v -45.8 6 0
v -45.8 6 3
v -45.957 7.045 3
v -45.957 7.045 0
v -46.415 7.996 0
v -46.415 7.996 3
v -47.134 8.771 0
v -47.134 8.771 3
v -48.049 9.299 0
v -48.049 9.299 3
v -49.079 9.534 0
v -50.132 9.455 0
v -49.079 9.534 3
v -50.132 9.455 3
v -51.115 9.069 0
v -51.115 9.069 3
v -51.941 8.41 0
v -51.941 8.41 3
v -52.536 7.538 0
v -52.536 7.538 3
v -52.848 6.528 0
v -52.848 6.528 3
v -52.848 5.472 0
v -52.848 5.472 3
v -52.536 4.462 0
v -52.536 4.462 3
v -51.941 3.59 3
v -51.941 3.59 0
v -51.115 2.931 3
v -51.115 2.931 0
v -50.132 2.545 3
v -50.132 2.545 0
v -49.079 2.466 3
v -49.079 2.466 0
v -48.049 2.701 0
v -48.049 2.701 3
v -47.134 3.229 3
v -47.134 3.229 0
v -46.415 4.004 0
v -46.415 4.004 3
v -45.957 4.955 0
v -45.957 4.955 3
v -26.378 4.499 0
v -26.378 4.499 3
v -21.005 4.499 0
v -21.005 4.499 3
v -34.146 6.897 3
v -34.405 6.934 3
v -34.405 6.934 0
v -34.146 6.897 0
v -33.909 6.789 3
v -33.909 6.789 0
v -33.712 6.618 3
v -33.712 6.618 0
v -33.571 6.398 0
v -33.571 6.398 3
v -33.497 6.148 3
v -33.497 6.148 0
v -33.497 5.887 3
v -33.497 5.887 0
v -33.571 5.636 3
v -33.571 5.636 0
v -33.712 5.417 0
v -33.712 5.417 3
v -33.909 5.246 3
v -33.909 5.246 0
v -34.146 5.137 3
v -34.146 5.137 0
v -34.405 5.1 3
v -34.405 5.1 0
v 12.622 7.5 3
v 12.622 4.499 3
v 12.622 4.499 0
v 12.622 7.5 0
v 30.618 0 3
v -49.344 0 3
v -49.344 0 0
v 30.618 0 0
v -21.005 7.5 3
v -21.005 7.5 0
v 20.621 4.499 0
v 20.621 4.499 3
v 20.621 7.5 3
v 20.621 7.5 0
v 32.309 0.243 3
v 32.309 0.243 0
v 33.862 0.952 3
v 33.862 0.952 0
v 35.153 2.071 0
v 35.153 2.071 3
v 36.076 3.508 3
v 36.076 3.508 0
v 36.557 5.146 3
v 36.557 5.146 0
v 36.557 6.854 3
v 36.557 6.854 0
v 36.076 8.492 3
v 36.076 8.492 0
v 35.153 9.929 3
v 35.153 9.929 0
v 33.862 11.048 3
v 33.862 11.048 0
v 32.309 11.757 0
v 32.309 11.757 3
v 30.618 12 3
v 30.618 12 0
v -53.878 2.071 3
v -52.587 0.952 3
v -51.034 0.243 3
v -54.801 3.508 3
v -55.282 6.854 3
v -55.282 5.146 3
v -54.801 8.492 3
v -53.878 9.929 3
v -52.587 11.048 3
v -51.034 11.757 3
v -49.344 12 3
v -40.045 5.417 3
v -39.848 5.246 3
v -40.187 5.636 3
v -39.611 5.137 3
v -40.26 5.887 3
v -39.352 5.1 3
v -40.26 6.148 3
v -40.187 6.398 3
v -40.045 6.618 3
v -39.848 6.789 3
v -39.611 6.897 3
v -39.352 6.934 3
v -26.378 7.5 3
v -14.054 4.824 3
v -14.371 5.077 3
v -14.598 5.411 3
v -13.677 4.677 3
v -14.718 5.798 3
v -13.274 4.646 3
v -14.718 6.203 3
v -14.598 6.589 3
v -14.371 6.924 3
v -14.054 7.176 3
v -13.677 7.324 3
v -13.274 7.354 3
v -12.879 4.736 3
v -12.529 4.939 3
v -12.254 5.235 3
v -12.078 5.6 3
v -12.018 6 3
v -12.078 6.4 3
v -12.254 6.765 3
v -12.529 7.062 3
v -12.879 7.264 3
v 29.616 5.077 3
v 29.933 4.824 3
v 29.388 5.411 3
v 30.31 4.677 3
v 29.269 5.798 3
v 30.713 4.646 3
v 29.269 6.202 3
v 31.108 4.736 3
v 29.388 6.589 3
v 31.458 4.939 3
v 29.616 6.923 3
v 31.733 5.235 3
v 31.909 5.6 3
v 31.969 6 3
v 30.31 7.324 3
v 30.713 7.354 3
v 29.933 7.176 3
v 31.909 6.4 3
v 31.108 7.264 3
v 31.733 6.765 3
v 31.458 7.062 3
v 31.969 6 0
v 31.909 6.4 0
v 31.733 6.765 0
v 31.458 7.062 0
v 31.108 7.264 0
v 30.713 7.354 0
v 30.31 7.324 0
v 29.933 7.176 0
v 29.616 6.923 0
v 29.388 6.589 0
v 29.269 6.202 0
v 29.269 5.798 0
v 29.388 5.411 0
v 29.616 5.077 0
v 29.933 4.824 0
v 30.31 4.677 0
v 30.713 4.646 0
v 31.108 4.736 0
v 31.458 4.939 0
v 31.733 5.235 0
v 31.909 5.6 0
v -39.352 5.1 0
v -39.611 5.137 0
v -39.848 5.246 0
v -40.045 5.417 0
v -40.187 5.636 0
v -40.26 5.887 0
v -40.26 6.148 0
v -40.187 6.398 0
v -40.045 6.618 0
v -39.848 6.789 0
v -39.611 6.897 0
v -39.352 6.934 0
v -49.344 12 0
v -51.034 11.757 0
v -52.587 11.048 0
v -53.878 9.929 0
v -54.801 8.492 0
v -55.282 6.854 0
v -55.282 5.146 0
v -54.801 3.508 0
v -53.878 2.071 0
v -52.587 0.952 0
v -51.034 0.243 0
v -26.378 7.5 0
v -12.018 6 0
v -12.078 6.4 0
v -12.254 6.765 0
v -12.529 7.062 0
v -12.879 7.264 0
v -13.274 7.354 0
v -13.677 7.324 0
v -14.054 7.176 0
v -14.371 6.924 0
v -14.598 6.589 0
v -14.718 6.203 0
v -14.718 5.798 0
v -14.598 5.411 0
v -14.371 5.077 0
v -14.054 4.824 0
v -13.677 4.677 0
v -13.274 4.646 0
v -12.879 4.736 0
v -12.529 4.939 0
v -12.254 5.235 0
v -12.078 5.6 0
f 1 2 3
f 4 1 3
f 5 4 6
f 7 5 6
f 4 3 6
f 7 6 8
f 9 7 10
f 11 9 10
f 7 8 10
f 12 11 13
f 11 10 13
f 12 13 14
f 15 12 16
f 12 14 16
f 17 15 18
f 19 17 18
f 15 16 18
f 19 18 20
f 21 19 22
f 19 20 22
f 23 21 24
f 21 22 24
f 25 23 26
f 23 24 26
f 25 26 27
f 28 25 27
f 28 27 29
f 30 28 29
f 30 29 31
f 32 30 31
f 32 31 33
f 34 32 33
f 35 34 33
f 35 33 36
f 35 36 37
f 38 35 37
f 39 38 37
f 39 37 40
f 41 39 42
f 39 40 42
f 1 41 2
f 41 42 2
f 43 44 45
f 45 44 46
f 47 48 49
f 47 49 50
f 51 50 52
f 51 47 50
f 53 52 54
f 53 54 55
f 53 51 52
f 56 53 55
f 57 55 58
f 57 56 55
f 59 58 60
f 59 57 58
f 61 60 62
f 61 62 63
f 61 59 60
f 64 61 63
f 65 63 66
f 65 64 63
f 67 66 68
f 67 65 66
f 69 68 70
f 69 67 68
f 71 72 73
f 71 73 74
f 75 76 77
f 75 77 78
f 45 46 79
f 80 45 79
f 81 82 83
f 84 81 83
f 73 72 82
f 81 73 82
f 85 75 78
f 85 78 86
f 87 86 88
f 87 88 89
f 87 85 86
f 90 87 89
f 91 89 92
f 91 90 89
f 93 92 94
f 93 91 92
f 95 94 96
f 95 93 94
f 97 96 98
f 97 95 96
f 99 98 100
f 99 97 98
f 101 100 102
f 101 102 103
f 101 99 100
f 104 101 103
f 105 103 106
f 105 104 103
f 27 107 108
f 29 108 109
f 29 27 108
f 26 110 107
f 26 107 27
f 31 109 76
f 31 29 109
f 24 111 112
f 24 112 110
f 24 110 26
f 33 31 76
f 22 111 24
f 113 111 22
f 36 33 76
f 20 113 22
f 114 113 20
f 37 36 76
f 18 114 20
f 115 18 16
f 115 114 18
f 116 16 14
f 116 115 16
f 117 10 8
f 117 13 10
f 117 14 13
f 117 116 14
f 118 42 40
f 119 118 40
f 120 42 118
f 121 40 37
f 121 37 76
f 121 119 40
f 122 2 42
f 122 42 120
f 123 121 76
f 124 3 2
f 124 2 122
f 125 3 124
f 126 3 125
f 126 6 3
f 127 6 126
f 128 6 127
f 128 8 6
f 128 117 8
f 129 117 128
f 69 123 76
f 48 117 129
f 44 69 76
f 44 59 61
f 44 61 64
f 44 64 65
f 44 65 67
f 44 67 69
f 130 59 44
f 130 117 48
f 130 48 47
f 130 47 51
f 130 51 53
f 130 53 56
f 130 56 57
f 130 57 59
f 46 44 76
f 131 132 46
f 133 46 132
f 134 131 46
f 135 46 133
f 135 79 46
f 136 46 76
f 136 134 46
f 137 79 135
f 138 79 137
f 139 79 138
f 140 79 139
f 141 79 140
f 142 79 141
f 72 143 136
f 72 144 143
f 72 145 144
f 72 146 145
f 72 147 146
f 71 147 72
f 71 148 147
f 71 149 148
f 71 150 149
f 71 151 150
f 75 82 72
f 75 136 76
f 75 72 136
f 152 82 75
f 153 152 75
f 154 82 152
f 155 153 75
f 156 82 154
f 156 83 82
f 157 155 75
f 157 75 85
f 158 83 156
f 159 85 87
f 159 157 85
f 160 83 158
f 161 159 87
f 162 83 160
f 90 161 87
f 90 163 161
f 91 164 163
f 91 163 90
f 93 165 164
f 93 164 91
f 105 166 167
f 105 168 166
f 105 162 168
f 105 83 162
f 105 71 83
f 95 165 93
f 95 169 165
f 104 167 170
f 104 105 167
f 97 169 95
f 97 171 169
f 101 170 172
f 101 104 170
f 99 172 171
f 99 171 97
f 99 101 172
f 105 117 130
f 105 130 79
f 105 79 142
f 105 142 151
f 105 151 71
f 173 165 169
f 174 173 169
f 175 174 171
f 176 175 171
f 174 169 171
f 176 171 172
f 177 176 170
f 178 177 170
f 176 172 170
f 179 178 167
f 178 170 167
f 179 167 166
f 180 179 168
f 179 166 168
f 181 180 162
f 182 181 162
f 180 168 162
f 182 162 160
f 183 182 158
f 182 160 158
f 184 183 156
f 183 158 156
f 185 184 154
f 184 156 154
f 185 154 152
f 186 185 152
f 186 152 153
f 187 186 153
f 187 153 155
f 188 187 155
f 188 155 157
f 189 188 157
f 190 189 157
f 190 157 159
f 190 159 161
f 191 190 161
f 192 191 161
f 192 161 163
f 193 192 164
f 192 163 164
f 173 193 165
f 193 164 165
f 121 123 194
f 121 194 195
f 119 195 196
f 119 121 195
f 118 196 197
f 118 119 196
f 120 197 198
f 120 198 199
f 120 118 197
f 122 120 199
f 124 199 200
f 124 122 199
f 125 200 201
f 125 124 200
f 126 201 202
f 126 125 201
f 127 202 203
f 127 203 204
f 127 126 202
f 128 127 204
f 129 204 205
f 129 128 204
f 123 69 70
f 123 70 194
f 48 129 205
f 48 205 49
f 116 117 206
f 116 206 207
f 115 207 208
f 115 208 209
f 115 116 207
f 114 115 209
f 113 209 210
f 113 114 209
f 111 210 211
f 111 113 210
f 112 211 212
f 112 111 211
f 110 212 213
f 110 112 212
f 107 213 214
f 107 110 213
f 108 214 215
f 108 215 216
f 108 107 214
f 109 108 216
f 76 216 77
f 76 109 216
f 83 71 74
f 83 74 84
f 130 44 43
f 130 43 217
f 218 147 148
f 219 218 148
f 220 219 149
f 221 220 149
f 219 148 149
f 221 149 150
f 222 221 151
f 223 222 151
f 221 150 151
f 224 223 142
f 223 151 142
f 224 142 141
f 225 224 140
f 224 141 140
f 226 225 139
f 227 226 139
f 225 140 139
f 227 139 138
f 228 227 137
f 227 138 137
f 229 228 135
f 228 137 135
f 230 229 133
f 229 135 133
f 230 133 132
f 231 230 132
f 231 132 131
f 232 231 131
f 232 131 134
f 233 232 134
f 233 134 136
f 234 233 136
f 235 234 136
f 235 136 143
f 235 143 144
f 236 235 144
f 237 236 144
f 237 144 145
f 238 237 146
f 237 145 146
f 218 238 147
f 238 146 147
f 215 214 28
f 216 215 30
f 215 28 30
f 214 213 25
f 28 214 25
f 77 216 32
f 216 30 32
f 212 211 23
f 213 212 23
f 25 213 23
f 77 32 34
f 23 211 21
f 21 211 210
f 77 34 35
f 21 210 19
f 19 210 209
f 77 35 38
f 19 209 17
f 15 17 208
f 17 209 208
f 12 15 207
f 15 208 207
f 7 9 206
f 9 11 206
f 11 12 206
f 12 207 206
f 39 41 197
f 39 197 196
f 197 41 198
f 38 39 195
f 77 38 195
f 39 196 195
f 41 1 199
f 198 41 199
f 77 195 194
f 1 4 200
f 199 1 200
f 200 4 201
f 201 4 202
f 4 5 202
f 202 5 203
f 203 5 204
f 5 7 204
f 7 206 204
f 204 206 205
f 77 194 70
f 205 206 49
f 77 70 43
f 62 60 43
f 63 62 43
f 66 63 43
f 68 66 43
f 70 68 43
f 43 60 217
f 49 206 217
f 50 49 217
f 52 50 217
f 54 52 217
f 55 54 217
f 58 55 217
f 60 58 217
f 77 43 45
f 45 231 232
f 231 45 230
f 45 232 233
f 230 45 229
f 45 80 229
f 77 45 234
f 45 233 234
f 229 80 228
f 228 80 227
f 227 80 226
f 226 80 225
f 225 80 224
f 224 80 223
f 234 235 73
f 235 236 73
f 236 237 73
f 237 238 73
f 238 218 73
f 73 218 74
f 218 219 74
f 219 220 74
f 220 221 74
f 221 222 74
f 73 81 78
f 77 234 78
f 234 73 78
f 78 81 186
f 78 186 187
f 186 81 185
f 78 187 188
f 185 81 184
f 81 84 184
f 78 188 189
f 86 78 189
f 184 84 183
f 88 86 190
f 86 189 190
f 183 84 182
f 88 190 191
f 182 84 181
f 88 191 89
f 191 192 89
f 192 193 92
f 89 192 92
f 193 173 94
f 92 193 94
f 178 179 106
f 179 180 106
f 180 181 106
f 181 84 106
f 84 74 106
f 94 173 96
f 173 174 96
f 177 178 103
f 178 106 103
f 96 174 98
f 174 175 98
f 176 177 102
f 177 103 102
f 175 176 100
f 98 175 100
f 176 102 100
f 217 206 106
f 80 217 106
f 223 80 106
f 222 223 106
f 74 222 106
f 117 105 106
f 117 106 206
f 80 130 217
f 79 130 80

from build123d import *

# Parameters (mm, degrees)
SKETCH_1_R      = 3.543825796
SKETCH_1_R_2    = 1.357591064
SKETCH_1_W      = 5.3728
SKETCH_1_H      = 3.0001
SKETCH_1_W_2    = 7.9992
EXTRUDE_1_DEPTH = 3


with BuildPart() as part:
    # 草图1 → 凸台-拉伸1 (new body)
    with BuildSketch(Plane.XY.offset(3)):
        with BuildLine():
            Line((-49.343510787, 0), (30.618171933, 0))
            ThreePointArc((30.618171933, 0), (36.618171933, 6), (30.618171933, 12))
            Line((30.618171933, 12), (-49.343510787, 12))
            ThreePointArc((-49.343510787, 12), (-55.343510787, 6), (-49.343510787, 0))
        make_face()
        with Locations((-49.343510787, 6)):
            Circle(SKETCH_1_R, mode=Mode.SUBTRACT)
        with Locations((-13.375343302, 6.0002)):
            Circle(SKETCH_1_R_2, mode=Mode.SUBTRACT)
        with Locations((30.611606698, 6.0001)):
            Circle(SKETCH_1_R_2, mode=Mode.SUBTRACT)
        with Locations((-23.691393302, 5.99945)):
            Rectangle(SKETCH_1_W, SKETCH_1_H, mode=Mode.SUBTRACT)
        with BuildLine():
            Line((-39.352347519, 6.934252935), (-34.404739086, 6.934252935))
            ThreePointArc((-34.404739086, 6.934252935), (-33.487662618, 6.017176468), (-34.404739086, 5.1001))
            Line((-34.404739086, 5.1001), (-39.352347519, 5.1001))
            ThreePointArc((-39.352347519, 5.1001), (-40.269423986, 6.017176468), (-39.352347519, 6.934252935))
        make_face(mode=Mode.SUBTRACT)
        with Locations((16.621706698, 5.99945)):
            Rectangle(SKETCH_1_W_2, SKETCH_1_H, mode=Mode.SUBTRACT)
    extrude(amount=-EXTRUDE_1_DEPTH)


solid = part.part
